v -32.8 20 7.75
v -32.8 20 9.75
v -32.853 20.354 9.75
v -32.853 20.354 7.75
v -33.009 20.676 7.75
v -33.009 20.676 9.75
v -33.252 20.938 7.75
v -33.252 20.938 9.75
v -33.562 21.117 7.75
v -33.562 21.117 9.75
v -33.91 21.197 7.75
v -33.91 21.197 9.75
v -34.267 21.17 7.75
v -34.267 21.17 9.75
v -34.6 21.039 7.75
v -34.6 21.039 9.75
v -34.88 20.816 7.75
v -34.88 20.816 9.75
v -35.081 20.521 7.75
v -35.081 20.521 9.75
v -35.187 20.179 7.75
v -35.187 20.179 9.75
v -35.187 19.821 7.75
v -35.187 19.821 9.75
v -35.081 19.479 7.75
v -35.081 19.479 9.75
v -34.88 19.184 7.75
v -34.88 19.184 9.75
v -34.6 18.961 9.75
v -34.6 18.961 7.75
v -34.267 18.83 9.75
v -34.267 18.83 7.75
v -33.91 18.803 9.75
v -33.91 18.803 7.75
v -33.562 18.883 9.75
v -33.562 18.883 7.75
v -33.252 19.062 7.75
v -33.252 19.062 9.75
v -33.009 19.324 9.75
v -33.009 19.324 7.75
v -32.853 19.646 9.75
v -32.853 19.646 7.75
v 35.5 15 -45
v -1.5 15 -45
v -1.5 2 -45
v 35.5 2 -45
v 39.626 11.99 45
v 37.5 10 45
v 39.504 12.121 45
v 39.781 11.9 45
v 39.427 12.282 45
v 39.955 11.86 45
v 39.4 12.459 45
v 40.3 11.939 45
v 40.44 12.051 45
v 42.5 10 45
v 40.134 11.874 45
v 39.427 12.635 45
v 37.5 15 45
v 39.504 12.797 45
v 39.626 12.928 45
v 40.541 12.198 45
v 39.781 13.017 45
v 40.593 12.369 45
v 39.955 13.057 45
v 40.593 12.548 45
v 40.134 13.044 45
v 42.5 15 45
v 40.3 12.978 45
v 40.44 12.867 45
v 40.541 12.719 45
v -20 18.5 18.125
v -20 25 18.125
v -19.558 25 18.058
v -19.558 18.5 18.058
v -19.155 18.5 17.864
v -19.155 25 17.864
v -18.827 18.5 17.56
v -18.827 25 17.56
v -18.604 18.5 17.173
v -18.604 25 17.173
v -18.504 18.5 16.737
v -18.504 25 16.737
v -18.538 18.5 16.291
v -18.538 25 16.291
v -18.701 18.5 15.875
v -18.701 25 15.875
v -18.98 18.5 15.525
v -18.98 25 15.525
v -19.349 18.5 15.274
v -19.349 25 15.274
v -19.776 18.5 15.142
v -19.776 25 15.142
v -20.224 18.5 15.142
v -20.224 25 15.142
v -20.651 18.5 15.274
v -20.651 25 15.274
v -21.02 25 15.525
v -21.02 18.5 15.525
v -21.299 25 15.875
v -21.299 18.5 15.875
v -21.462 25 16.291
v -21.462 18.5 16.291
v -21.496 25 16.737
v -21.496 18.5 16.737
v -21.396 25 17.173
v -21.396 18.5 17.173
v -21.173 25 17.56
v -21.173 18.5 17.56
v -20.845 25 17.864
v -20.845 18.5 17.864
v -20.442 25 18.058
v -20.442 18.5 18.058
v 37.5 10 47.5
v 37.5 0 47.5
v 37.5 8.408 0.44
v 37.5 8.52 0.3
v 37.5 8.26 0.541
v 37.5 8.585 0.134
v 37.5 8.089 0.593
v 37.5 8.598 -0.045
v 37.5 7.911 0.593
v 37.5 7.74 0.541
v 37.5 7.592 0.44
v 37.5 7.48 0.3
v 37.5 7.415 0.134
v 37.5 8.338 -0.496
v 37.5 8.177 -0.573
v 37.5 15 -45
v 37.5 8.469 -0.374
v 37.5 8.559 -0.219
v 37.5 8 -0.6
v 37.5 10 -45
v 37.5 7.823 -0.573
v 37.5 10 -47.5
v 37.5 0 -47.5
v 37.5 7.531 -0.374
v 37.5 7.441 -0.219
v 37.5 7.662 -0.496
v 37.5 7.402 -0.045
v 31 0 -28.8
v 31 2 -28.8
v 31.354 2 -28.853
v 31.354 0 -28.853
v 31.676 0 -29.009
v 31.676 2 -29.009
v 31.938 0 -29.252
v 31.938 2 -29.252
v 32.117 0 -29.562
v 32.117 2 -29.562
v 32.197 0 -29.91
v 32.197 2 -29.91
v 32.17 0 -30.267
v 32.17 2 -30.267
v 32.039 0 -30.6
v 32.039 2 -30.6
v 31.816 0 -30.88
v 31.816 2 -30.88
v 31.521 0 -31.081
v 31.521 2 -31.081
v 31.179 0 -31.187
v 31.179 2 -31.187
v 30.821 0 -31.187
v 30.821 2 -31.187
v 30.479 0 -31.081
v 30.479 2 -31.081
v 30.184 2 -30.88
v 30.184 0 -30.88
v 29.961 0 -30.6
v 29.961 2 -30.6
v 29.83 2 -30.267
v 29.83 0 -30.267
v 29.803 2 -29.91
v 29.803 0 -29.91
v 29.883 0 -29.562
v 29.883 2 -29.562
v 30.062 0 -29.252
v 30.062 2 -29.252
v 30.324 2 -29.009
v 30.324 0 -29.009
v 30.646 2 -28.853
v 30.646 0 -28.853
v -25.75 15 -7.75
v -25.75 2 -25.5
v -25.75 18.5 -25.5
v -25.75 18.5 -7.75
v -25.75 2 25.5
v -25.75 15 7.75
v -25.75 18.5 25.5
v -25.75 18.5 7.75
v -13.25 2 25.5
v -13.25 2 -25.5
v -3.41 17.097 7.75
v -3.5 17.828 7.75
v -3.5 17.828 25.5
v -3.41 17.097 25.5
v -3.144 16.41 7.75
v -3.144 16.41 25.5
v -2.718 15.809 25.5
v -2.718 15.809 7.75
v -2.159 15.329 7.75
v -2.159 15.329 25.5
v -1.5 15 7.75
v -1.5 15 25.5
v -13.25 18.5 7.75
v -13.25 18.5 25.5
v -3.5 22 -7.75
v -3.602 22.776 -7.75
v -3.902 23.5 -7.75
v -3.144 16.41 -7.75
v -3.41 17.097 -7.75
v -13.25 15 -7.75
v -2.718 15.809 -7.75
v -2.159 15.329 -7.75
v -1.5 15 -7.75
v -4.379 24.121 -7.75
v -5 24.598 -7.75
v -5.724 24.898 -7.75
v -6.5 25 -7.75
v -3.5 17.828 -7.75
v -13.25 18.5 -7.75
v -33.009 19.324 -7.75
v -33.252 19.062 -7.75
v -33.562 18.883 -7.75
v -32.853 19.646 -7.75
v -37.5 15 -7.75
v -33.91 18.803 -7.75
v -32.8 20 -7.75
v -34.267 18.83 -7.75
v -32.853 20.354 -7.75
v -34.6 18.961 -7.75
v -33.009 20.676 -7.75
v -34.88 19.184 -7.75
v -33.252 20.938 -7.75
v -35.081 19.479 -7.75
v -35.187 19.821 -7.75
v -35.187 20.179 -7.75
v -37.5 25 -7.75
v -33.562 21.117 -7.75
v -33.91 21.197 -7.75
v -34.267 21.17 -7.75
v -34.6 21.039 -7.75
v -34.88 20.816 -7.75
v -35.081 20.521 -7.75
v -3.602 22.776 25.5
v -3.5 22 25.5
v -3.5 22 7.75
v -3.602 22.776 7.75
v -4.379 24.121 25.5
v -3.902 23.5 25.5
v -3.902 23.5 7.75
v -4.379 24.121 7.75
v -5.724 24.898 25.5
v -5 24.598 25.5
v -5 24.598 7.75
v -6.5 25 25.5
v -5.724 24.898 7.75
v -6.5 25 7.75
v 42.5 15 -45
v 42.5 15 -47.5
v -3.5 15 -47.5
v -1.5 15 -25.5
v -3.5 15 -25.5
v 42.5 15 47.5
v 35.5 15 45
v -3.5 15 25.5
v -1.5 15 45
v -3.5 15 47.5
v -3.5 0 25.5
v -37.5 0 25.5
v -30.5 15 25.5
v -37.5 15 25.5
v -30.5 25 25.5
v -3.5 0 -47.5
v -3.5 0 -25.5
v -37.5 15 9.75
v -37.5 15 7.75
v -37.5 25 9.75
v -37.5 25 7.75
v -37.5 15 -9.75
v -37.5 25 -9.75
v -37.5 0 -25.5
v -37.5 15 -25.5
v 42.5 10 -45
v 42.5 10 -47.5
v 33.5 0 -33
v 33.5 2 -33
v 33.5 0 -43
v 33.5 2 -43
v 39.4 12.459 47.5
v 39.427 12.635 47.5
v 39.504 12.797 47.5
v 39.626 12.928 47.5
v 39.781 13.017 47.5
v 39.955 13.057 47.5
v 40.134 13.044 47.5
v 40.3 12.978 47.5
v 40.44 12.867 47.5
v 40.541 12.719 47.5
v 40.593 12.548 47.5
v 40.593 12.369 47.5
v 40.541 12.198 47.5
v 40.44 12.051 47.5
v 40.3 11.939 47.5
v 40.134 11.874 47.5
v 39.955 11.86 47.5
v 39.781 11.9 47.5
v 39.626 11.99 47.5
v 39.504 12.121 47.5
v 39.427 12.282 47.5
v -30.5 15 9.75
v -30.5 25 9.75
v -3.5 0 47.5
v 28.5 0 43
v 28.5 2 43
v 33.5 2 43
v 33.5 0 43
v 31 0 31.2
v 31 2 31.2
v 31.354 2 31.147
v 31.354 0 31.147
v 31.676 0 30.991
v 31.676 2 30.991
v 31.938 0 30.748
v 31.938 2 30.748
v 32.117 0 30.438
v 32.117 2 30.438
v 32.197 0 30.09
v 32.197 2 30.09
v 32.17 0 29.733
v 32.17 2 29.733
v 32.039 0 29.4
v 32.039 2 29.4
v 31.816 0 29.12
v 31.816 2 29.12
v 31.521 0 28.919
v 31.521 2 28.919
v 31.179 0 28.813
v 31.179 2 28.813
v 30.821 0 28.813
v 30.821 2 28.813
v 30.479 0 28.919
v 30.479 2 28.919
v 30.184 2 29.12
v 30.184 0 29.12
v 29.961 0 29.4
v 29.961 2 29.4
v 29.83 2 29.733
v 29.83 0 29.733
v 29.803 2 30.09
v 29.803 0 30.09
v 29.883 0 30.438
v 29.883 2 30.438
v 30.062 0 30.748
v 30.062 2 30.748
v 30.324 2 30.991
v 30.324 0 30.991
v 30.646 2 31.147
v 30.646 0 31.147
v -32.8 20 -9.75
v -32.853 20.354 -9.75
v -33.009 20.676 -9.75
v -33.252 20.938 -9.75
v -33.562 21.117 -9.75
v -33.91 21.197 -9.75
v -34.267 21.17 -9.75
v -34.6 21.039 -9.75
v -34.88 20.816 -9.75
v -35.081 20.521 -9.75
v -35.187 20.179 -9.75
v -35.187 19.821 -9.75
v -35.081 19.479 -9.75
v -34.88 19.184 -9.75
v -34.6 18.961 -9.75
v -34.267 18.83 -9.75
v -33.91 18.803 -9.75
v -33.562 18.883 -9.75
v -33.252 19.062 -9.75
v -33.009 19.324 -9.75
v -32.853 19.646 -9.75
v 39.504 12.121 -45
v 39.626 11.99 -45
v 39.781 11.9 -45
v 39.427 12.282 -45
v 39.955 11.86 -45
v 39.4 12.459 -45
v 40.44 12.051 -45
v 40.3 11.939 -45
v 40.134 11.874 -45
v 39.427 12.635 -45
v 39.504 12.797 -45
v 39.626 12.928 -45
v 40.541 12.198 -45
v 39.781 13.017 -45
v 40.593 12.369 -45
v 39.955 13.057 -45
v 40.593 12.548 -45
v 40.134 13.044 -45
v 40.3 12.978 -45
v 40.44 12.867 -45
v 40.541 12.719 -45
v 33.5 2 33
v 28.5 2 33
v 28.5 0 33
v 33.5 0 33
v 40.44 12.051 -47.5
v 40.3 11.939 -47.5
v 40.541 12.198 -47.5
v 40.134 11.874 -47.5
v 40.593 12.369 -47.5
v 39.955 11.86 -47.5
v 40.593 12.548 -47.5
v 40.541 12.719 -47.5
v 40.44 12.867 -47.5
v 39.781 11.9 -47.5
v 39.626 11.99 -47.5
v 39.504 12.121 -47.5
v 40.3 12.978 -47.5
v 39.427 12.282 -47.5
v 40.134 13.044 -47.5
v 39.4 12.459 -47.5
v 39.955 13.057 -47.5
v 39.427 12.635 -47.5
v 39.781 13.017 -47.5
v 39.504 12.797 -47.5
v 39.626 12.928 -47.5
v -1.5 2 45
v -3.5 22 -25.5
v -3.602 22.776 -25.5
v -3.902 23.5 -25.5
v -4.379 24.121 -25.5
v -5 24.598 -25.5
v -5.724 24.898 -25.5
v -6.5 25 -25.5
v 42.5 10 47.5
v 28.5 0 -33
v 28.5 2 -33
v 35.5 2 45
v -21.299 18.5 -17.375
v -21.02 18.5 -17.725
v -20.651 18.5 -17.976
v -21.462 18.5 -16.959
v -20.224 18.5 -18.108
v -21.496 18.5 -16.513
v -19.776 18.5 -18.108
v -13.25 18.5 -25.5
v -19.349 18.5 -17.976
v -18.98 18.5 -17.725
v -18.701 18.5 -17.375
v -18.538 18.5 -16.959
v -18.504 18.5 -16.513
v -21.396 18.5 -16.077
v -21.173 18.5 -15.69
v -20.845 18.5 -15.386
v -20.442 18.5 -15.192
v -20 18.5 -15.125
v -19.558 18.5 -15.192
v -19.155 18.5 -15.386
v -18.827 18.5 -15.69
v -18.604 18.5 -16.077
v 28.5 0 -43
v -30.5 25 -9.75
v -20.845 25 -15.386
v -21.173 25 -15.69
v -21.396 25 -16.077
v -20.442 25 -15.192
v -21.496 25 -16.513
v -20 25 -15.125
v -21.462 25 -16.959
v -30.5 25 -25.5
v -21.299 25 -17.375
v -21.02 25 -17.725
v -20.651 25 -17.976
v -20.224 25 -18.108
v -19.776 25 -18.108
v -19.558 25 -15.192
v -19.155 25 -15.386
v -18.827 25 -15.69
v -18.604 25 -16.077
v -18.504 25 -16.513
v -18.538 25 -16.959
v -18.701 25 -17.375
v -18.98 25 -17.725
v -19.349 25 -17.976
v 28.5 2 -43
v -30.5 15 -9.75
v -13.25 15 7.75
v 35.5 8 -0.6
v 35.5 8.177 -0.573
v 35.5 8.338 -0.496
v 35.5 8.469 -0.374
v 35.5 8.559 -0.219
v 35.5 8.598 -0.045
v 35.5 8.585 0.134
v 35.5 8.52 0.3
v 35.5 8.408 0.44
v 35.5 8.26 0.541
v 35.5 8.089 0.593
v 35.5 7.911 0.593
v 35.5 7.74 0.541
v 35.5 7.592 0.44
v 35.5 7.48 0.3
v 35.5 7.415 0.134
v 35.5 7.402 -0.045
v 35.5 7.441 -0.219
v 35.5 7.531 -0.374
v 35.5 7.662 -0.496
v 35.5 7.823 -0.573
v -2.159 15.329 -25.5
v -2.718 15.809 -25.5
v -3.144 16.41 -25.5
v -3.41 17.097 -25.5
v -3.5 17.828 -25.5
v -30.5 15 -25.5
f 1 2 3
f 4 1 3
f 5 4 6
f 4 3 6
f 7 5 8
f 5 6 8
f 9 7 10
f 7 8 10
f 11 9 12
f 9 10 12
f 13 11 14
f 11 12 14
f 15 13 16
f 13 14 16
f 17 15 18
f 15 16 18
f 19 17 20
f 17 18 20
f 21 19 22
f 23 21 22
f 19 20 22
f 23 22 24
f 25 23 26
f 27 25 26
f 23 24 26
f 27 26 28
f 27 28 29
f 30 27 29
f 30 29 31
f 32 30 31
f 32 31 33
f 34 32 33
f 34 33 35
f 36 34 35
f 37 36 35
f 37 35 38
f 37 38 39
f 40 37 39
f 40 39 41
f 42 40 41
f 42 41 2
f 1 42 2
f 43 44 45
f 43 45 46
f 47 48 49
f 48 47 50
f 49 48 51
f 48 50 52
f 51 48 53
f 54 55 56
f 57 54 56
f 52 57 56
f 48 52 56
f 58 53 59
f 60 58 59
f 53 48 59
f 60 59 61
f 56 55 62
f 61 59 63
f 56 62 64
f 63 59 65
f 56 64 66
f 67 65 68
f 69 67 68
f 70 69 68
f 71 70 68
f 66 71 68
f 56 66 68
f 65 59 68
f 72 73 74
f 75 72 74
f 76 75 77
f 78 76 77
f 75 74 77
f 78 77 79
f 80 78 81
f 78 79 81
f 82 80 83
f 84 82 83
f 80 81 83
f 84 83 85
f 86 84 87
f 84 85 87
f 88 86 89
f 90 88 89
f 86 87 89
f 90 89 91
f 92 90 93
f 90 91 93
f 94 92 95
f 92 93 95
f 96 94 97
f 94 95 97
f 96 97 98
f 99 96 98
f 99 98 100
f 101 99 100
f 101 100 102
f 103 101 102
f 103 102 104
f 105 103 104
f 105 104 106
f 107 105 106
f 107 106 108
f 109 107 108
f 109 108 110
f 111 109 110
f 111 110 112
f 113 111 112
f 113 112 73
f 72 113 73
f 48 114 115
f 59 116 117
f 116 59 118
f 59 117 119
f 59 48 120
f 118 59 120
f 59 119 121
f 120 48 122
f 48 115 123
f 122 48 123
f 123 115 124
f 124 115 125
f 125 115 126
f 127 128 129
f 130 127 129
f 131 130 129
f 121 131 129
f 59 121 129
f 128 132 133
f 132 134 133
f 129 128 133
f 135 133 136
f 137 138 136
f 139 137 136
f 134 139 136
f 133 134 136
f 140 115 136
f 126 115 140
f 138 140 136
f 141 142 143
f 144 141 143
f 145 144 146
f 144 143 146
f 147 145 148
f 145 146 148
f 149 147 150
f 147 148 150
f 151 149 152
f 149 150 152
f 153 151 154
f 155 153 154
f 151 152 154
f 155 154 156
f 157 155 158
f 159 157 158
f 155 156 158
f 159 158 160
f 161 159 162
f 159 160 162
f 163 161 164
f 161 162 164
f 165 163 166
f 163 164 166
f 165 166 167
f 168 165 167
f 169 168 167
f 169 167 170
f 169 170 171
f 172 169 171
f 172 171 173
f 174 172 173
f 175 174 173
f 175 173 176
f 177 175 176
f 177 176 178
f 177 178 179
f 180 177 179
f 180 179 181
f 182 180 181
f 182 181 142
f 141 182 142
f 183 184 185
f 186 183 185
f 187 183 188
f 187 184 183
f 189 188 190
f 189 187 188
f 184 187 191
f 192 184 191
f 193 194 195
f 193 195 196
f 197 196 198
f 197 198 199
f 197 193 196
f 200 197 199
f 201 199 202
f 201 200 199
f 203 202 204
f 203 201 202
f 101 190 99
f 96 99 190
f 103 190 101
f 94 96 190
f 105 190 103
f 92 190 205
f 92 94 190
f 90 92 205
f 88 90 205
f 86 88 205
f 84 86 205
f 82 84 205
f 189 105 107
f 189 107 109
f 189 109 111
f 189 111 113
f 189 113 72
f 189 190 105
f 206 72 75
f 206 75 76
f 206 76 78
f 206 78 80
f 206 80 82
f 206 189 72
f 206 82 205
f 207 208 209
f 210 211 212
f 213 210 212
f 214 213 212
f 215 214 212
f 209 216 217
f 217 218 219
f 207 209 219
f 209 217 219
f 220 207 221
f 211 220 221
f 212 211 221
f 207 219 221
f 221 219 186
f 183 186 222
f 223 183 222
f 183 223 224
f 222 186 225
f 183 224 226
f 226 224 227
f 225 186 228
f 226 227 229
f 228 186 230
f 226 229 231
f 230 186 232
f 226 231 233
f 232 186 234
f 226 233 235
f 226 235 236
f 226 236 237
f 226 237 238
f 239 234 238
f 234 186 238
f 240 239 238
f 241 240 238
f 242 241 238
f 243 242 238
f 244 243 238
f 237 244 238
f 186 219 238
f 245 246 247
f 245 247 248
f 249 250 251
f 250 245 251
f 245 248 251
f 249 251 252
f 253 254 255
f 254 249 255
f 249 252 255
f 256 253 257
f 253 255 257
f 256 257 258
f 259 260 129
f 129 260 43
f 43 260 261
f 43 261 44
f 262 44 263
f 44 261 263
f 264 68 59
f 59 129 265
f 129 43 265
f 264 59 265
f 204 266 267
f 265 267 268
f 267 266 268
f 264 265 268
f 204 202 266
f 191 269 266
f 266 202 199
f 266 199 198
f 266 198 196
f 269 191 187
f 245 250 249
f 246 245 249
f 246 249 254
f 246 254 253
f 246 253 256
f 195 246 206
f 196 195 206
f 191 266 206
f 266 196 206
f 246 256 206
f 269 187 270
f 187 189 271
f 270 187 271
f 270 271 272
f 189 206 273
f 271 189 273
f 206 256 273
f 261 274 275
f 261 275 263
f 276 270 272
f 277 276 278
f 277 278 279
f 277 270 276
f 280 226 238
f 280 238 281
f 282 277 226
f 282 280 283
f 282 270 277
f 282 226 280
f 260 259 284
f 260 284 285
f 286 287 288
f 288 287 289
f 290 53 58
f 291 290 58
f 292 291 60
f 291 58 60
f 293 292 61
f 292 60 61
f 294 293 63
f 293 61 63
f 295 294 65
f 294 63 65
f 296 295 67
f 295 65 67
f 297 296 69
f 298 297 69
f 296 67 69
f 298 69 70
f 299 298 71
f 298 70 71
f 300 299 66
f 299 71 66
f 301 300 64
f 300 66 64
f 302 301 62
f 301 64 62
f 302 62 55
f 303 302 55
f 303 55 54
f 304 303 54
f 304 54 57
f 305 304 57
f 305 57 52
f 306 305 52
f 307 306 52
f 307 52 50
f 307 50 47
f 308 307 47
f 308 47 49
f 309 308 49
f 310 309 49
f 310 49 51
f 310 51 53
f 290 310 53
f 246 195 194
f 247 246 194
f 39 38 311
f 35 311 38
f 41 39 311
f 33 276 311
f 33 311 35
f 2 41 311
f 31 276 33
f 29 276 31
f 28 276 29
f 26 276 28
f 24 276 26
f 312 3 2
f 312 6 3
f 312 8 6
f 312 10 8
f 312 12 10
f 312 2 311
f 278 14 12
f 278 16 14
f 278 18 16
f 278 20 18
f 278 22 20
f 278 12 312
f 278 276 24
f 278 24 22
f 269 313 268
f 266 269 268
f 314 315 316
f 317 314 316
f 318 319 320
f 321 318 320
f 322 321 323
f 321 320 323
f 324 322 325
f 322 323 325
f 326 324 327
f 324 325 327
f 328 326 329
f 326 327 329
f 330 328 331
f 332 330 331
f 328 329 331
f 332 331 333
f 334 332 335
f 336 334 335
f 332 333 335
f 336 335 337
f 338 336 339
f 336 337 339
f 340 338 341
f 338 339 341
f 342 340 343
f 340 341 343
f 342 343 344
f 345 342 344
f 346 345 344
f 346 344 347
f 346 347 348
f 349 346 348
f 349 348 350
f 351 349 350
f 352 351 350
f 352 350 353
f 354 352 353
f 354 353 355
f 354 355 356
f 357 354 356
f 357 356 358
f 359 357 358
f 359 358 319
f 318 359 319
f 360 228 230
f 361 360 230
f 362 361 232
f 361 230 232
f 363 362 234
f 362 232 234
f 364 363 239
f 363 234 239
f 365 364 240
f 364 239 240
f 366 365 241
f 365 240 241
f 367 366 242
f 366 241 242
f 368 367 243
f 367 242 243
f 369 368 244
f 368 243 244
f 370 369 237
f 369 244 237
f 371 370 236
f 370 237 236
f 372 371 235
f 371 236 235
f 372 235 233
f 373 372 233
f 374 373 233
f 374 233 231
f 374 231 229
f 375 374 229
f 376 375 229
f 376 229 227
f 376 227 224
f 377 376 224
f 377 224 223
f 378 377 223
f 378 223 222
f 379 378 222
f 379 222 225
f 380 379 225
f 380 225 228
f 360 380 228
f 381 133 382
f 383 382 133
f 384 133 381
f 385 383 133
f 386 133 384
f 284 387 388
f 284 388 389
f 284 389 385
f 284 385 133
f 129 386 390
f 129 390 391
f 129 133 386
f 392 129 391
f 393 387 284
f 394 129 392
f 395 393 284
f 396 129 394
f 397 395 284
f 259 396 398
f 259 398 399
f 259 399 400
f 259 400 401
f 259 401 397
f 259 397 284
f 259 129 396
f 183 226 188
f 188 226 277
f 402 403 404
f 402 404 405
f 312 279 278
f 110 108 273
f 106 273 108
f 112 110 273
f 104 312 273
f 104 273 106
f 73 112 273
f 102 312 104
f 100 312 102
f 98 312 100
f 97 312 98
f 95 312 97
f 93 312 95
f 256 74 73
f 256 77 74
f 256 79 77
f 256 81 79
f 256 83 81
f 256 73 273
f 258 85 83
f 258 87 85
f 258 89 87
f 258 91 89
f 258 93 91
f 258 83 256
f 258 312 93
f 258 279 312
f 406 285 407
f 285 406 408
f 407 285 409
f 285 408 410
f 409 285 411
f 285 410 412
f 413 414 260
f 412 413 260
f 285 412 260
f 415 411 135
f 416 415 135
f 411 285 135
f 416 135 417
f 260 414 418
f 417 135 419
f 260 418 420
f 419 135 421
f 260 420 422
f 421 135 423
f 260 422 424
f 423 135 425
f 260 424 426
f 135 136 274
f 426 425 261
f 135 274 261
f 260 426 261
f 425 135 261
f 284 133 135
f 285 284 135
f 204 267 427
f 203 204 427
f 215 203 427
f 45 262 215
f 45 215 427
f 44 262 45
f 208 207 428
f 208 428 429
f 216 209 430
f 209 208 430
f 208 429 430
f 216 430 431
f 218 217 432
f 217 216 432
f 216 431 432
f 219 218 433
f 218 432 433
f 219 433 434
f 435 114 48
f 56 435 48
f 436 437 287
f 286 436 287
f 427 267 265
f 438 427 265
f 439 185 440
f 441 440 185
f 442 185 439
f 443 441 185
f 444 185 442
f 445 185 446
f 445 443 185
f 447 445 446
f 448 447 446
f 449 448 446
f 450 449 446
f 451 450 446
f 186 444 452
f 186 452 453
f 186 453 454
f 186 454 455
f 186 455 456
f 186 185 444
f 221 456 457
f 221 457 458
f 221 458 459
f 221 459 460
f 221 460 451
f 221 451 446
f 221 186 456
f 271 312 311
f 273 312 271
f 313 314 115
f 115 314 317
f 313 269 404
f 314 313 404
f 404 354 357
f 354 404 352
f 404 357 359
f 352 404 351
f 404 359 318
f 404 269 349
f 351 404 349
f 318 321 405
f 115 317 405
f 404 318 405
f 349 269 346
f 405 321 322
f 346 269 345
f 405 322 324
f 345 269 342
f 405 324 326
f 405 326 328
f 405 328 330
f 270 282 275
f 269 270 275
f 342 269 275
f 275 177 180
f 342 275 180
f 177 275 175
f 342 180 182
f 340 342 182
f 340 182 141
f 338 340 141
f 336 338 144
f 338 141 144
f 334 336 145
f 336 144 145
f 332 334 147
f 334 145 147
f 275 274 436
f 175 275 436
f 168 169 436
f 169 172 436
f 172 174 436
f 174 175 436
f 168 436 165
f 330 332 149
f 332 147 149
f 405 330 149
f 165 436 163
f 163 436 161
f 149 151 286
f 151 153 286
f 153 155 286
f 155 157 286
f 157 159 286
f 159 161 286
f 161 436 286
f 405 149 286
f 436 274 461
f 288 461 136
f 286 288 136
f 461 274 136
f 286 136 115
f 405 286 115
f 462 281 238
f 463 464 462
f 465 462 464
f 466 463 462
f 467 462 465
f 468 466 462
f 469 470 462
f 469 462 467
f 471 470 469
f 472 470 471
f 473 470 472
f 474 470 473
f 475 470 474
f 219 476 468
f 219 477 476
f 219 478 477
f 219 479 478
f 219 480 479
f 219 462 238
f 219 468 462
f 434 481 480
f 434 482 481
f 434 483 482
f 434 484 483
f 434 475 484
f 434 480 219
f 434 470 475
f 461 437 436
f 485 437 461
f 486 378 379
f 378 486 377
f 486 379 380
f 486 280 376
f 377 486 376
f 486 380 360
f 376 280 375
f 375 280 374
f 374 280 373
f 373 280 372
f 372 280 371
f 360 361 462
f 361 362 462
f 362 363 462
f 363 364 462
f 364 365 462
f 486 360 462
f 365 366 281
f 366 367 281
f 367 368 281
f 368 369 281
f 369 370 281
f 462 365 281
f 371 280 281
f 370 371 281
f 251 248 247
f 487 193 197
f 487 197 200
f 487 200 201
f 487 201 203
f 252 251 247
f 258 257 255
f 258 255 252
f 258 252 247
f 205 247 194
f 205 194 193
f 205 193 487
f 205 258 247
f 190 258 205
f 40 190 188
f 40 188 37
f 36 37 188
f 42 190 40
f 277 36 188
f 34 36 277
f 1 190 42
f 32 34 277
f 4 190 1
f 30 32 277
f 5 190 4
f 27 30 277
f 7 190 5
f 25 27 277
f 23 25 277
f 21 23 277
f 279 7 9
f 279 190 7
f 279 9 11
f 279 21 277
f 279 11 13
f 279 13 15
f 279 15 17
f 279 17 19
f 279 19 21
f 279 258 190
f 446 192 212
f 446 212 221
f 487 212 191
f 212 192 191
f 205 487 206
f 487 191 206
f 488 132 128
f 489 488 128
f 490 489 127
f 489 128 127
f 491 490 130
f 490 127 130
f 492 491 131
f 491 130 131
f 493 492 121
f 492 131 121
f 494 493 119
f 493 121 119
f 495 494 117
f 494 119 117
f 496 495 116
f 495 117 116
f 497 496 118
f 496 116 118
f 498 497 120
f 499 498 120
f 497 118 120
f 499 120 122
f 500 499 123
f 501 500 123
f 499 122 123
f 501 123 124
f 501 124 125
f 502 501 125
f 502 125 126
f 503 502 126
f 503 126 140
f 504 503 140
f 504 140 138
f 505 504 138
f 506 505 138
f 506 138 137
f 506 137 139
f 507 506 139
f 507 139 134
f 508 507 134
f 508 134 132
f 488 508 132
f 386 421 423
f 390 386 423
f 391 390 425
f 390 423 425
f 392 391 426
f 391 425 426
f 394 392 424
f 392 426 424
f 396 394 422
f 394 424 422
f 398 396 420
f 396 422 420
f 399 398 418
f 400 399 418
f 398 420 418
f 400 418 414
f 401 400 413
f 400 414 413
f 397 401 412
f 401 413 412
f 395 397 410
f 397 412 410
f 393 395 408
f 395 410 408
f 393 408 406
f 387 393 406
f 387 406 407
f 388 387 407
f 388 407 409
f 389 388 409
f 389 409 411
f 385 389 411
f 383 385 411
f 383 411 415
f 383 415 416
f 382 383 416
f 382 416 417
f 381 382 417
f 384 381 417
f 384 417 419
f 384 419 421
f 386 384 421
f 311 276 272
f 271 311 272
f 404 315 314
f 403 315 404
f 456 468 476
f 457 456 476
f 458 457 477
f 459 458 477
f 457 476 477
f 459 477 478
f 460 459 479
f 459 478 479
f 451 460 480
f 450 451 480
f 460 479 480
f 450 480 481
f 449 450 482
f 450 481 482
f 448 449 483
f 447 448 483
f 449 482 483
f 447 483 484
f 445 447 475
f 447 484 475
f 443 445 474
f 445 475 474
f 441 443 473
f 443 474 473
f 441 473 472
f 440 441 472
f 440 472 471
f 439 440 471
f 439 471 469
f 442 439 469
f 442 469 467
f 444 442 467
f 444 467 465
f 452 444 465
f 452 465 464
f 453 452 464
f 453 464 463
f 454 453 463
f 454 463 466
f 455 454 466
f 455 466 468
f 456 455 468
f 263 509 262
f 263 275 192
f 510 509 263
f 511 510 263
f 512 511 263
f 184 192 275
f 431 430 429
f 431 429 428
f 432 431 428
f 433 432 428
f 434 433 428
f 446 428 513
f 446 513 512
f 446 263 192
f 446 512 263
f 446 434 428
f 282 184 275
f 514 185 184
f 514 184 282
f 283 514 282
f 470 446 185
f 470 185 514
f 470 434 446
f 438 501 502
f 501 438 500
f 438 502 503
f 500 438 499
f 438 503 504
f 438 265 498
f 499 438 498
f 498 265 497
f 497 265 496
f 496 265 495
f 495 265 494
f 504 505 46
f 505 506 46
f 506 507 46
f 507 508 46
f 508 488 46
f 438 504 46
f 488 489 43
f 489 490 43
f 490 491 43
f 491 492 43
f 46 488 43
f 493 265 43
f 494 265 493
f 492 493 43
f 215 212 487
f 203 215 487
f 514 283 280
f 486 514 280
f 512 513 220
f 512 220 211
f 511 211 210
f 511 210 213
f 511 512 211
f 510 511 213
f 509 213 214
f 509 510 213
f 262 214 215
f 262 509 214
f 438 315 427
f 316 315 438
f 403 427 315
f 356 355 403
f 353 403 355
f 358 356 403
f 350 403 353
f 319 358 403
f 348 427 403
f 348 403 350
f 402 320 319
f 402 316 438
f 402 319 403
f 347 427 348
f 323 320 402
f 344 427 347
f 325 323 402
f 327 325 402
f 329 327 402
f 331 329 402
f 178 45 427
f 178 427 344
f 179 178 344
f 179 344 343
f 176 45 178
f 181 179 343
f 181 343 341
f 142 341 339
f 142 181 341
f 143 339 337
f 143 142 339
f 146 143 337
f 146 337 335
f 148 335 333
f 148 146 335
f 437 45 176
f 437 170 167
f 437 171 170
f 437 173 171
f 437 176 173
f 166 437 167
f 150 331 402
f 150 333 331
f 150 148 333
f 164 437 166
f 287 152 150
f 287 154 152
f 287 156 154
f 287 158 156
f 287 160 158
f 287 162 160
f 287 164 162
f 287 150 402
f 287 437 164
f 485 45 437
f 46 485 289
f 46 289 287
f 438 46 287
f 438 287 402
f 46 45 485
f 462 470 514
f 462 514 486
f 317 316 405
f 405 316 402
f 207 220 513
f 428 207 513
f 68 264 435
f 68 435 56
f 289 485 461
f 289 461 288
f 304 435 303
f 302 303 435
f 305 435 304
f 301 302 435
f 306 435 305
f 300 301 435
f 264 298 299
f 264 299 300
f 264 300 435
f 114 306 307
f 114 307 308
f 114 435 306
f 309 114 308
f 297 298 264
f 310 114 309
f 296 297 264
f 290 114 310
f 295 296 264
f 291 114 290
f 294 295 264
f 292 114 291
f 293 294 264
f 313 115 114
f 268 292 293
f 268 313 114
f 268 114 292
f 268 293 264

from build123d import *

# Parameters (mm, degrees)
SKETCH1_W           = 75
SKETCH1_H           = 95
BOSS_EXTRUDE1_DEPTH = 15
SKETCH2_W           = 95
SKETCH2_H           = 5
BOSS_EXTRUDE2_DEPTH = 5
SKETCH3_R           = 0.6
CUT_EXTRUDE1_DEPTH  = 100
SKETCH4_W           = 5
SKETCH4_H           = 90
CUT_EXTRUDE2_DEPTH  = 100
SKETCH5_W           = 34
SKETCH5_H           = 15
CUT_EXTRUDE3_DEPTH  = 22
SKETCH6_W           = 34
SKETCH6_H           = 15
CUT_EXTRUDE4_DEPTH  = 22
SKETCH7_W           = 37
SKETCH7_H           = 90
CUT_EXTRUDE5_DEPTH  = 13
SKETCH10_W          = 34
SKETCH10_H          = 51
BOSS_EXTRUDE3_DEPTH = 10
SKETCH11_W          = 12.5
SKETCH11_H          = 16.5
CUT_EXTRUDE6_DEPTH  = 100
SKETCH12_W          = 15.5
SKETCH12_H          = 10
CUT_EXTRUDE8_DEPTH  = 100
SKETCH13_W          = 15.75
SKETCH13_H          = 10
CUT_EXTRUDE9_DEPTH  = 7
SKETCH14_W          = 15.75
SKETCH14_H          = 10
CUT_EXTRUDE10_DEPTH = 7
SKETCH15_R          = 1.2
CUT_EXTRUDE11_DEPTH = 100
SKETCH16_R          = 1.2
SKETCH16_W          = 5
SKETCH16_H          = 10
CUT_EXTRUDE12_DEPTH = 100
SKETCH17_R          = 1.5
CUT_EXTRUDE14_DEPTH = 10
FILLET3_R           = 3
FILLET4_R           = 3
SKETCH19_R          = 0.6
CUT_EXTRUDE15_DEPTH = 10


with BuildPart() as part:
    # Sketch1 → Boss-Extrude1 (new body)
    with BuildSketch(Plane(origin=(0, 0, 0), x_dir=(1, 0, 0), z_dir=(0, 1, 0))):
        Rectangle(SKETCH1_W, SKETCH1_H)
    extrude(amount=BOSS_EXTRUDE1_DEPTH)

    # Sketch2 → Boss-Extrude2 (add)
    with BuildSketch(Plane(origin=(37.5, 0, 0), x_dir=(0, 0, -1), z_dir=(1, 0, 0))):
        with Locations((0, 12.5)):
            Rectangle(SKETCH2_W, SKETCH2_H)
    extrude(amount=BOSS_EXTRUDE2_DEPTH)

    # Sketch3 → Cut-Extrude1 (cut)
    with BuildSketch(Plane(origin=(0, 0, -47.5), x_dir=(-1, 0, 0), z_dir=(0, 0, -1))):
        with Locations((-40, 12.458610353)):
            Circle(SKETCH3_R)
    extrude(amount=-CUT_EXTRUDE1_DEPTH, mode=Mode.SUBTRACT)

    # Sketch4 → Cut-Extrude2 (cut)
    with BuildSketch(Plane(origin=(0, 15, 0), x_dir=(1, 0, 0), z_dir=(0, 1, 0))):
        with Locations((40, 0)):
            Rectangle(SKETCH4_W, SKETCH4_H)
    extrude(amount=-CUT_EXTRUDE2_DEPTH, mode=Mode.SUBTRACT)

    # Sketch5 → Cut-Extrude3 (cut)
    with BuildSketch(Plane(origin=(0, 0, -47.5), x_dir=(-1, 0, 0), z_dir=(0, 0, -1))):
        with Locations((20.5, 7.5)):
            Rectangle(SKETCH5_W, SKETCH5_H)
    extrude(amount=-CUT_EXTRUDE3_DEPTH, mode=Mode.SUBTRACT)

    # Sketch6 → Cut-Extrude4 (cut)
    with BuildSketch(Plane.XY.offset(47.5)):
        with Locations((-20.5, 7.5)):
            Rectangle(SKETCH6_W, SKETCH6_H)
    extrude(amount=-CUT_EXTRUDE4_DEPTH, mode=Mode.SUBTRACT)

    # Sketch7 → Cut-Extrude5 (cut)
    with BuildSketch(Plane(origin=(0, 15, 0), x_dir=(1, 0, 0), z_dir=(0, 1, 0))):
        with Locations((17, 0)):
            Rectangle(SKETCH7_W, SKETCH7_H)
    extrude(amount=-CUT_EXTRUDE5_DEPTH, mode=Mode.SUBTRACT)

    # Sketch10 → Boss-Extrude3 (add)
    with BuildSketch(Plane(origin=(0, 15, 0), x_dir=(1, 0, 0), z_dir=(0, 1, 0))):
        with Locations((-20.5, 0)):
            Rectangle(SKETCH10_W, SKETCH10_H)
    extrude(amount=BOSS_EXTRUDE3_DEPTH)

    # Sketch11 → Cut-Extrude6 (cut)
    with BuildSketch(Plane.XY.offset(25.5)):
        with Locations((-19.5, 10.25)):
            Rectangle(SKETCH11_W, SKETCH11_H)
    extrude(amount=-CUT_EXTRUDE6_DEPTH, mode=Mode.SUBTRACT)

    # Sketch12 → Cut-Extrude8 (cut)
    with BuildSketch(Plane.ZY.offset(37.5)):
        with Locations((0, 20)):
            Rectangle(SKETCH12_W, SKETCH12_H)
    extrude(amount=-CUT_EXTRUDE8_DEPTH, mode=Mode.SUBTRACT)

    # Sketch13 → Cut-Extrude9 (cut)
    with BuildSketch(Plane.ZY.offset(37.5)):
        with Locations((-17.625, 20)):
            Rectangle(SKETCH13_W, SKETCH13_H)
    extrude(amount=-CUT_EXTRUDE9_DEPTH, mode=Mode.SUBTRACT)

    # Sketch14 → Cut-Extrude10 (cut)
    with BuildSketch(Plane.ZY.offset(37.5)):
        with Locations((17.625, 20)):
            Rectangle(SKETCH14_W, SKETCH14_H)
    extrude(amount=-CUT_EXTRUDE10_DEPTH, mode=Mode.SUBTRACT)

    # Sketch15 → Cut-Extrude11 (cut)
    with BuildSketch(Plane.XY.offset(9.75)):
        with Locations((-34, 20)):
            Circle(SKETCH15_R)
    extrude(amount=-CUT_EXTRUDE11_DEPTH, mode=Mode.SUBTRACT)

    # Sketch16 → Cut-Extrude12 (cut)
    with BuildSketch(Plane(origin=(0, 2, 0), x_dir=(1, 0, 0), z_dir=(0, 1, 0))):
        with Locations(Location((31, 30, 0), (0, 0, 270))):
            Circle(SKETCH16_R)
        with Locations(Location((31, -30, 0), (0, 0, 270))):
            Circle(SKETCH16_R)
        with Locations((31, -38)):
            Rectangle(SKETCH16_W, SKETCH16_H)
        with Locations((31, 38)):
            Rectangle(SKETCH16_W, SKETCH16_H)
    extrude(amount=-CUT_EXTRUDE12_DEPTH, mode=Mode.SUBTRACT)

    # Sketch17 → Cut-Extrude14 (cut)
    with BuildSketch(Plane(origin=(0, 25, 0), x_dir=(1, 0, 0), z_dir=(0, 1, 0))):
        with Locations(Location((-20, -16.625, 0), (0, 0, 270))):
            Circle(SKETCH17_R)
        with Locations(Location((-20, 16.625, 0), (0, 0, 270))):
            Circle(SKETCH17_R)
    extrude(amount=-CUT_EXTRUDE14_DEPTH, mode=Mode.SUBTRACT)

    # Fillet3
    # the kernel refuses this fillet: 3 mm, written as the material it adds along each edge
    with BuildSketch(Plane(origin=(-3.5, 15, -25.5), x_dir=(1, 0, 0), z_dir=(0, 0, 1))) as fillet3_piece_1:
        with BuildLine():
            CenterArc((3, 2.828427125), FILLET3_R, 180, 70.528779366)
            Line((0, 2.828427125), (0, 0))
            Line((0, 0), (2, 0))
        make_face()
    extrude(amount=17.75)
    # the kernel refuses this fillet: 3 mm, written as the material it takes off along each edge
    with BuildSketch(Plane(origin=(-3.5, 25, -33), x_dir=(-1, 0, 0), z_dir=(0, 0, 1))) as fillet3_2_piece_1:
        with BuildLine():
            CenterArc((FILLET3_R, FILLET3_R), FILLET3_R, 180, 90)
            Line((0, FILLET3_R), (0, 0))
            Line((0, 0), (FILLET3_R, 0))
        make_face()
    extrude(amount=32.75, mode=Mode.SUBTRACT)

    # Fillet4
    # the kernel refuses this fillet: 3 mm, written as the material it adds along each edge
    with BuildSketch(Plane(origin=(-3.5, 15, 7.75), x_dir=(1, 0, 0), z_dir=(0, 0, 1))) as fillet4_piece_1:
        with BuildLine():
            CenterArc((3, 2.828427125), FILLET4_R, 180, 70.528779366)
            Line((0, 2.828427125), (0, 0))
            Line((0, 0), (2, 0))
        make_face()
    extrude(amount=17.75)
    # the kernel refuses this fillet: 3 mm, written as the material it takes off along each edge
    with BuildSketch(Plane(origin=(-3.5, 25, 0.25), x_dir=(-1, 0, 0), z_dir=(0, 0, 1))) as fillet4_2_piece_1:
        with BuildLine():
            CenterArc((FILLET4_R, FILLET4_R), FILLET4_R, 180, 90)
            Line((0, FILLET4_R), (0, 0))
            Line((0, 0), (FILLET4_R, 0))
        make_face()
    extrude(amount=32.75, mode=Mode.SUBTRACT)

    # Sketch19 → Cut-Extrude15 (cut)
    with BuildSketch(Plane(origin=(37.5, 0, 0), x_dir=(0, 0, -1), z_dir=(1, 0, 0))):
        with Locations((0, 8)):
            Circle(SKETCH19_R)
    extrude(amount=-CUT_EXTRUDE15_DEPTH, mode=Mode.SUBTRACT)


solid = part.part
